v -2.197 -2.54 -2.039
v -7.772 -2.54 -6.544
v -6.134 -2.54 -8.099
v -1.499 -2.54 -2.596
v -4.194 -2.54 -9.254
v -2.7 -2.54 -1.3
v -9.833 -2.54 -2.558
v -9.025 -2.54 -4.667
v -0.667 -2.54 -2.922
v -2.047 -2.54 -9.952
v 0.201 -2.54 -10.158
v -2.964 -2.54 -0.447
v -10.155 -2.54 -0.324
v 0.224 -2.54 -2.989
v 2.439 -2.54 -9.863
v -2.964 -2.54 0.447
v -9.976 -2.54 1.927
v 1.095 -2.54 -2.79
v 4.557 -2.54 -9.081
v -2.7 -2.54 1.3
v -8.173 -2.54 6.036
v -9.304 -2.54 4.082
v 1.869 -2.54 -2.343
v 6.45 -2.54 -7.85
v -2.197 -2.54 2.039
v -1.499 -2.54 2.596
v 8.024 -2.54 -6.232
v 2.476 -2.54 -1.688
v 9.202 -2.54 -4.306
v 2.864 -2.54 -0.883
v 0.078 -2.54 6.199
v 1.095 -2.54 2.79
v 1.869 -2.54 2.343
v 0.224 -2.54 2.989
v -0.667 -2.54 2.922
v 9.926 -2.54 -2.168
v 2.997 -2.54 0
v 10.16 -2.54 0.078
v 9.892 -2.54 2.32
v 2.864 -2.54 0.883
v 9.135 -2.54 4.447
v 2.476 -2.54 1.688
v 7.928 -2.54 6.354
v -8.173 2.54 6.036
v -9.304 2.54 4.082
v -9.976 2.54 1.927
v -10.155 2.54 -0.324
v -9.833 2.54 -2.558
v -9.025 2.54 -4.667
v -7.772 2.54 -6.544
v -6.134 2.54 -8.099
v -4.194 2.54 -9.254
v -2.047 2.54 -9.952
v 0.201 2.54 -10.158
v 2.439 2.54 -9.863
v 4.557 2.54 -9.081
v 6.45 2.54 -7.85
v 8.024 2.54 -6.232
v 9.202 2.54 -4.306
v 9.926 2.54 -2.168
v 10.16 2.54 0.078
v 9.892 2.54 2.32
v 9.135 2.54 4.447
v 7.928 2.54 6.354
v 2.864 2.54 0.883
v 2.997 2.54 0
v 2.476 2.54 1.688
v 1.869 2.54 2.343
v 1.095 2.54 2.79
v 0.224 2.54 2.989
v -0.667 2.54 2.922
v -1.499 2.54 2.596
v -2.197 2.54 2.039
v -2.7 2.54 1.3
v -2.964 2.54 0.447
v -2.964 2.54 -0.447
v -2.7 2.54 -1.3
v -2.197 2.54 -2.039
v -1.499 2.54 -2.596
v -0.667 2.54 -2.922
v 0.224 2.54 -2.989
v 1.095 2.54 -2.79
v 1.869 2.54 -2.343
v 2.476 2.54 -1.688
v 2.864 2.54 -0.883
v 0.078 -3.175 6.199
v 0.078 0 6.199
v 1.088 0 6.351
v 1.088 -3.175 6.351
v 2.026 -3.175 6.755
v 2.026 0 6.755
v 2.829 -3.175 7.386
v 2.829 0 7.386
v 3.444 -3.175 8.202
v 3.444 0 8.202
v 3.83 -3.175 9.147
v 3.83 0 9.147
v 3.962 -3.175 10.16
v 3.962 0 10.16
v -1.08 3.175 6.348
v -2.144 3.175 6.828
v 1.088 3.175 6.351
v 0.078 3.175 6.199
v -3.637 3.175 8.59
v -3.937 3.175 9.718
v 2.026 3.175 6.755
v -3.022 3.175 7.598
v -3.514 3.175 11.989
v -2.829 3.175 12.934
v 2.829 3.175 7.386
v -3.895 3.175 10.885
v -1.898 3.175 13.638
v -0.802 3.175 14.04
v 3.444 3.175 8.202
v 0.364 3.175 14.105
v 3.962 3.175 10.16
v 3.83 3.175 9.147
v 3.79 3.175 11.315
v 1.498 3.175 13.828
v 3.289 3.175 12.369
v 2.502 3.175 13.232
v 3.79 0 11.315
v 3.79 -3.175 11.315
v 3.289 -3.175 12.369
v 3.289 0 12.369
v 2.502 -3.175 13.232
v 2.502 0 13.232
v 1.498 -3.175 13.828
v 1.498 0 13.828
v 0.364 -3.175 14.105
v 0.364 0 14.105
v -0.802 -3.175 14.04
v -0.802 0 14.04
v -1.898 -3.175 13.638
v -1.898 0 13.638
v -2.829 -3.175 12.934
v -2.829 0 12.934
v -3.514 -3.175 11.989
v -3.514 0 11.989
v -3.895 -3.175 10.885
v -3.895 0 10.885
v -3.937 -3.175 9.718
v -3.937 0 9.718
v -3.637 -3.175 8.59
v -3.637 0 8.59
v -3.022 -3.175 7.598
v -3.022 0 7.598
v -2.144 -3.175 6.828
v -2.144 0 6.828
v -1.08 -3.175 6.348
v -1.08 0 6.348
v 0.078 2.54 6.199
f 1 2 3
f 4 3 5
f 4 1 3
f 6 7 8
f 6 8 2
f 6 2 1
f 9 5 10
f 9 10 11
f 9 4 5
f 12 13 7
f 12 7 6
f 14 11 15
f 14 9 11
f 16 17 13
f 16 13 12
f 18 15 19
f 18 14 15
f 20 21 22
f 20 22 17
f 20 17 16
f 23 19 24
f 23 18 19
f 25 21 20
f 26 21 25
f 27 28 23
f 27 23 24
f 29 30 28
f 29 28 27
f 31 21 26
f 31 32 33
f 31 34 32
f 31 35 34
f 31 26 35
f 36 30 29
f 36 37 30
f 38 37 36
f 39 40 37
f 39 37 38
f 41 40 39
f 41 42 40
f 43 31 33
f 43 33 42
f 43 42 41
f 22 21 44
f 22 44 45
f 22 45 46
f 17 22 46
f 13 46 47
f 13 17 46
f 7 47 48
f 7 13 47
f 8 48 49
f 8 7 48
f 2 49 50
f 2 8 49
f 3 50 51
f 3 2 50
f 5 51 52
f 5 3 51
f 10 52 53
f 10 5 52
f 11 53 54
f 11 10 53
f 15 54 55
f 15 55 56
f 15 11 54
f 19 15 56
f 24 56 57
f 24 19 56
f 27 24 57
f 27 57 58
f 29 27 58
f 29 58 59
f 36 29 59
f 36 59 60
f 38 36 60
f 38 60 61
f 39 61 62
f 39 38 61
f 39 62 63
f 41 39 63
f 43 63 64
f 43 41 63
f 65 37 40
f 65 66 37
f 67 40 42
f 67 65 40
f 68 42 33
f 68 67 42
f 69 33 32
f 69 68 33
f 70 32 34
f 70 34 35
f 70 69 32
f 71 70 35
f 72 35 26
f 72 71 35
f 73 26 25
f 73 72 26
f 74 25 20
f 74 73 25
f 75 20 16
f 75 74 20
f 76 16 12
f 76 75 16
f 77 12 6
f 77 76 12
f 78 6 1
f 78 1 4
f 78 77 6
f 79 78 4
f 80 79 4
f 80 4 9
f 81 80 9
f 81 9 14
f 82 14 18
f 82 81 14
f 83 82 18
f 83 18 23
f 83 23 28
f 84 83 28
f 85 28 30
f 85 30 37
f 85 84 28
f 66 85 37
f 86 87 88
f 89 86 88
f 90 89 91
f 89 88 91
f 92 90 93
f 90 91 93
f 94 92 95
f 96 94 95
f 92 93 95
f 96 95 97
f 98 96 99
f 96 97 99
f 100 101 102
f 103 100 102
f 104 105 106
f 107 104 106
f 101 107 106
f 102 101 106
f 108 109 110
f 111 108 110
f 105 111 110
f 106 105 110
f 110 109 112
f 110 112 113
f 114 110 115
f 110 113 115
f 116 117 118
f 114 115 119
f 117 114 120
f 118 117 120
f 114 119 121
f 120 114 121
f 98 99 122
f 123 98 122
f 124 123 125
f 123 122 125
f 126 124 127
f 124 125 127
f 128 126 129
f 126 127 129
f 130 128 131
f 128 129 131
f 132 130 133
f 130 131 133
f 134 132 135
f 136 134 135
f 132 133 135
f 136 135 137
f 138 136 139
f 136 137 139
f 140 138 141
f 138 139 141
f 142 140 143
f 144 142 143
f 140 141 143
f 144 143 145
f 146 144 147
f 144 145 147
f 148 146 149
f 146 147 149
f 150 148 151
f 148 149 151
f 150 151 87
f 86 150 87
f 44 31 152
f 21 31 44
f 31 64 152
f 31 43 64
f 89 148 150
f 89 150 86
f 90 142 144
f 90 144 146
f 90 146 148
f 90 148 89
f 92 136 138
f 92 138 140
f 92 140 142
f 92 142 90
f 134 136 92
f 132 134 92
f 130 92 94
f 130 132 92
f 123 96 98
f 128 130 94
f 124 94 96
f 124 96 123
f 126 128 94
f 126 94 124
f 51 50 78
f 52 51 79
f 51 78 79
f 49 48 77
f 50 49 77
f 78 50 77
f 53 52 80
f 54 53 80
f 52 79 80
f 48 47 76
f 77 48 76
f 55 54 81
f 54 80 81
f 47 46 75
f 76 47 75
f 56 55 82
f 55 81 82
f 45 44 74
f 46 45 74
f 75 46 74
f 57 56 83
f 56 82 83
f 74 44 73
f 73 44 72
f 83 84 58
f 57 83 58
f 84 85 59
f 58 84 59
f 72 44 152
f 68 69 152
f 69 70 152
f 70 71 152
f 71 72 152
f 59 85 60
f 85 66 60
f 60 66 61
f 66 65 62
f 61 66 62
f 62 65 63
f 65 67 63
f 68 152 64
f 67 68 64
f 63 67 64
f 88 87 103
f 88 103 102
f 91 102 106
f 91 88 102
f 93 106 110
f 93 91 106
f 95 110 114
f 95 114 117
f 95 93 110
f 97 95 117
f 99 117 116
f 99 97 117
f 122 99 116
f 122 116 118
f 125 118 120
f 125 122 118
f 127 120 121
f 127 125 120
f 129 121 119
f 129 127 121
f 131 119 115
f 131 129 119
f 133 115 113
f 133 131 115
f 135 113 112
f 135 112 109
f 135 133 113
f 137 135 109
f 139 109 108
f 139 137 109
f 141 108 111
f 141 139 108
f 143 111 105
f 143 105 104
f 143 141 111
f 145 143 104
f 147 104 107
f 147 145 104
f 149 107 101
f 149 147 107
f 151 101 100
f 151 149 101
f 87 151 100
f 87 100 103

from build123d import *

# Parameters (mm, degrees)
F0_R     = 2.9972
F1_DEPTH = 2.54
F2_DEPTH = 3.175


# Not quite as in the source:
# - a feature names something its author has since deleted; it is built from what else it names


with BuildPart() as f1:
    # F0 (on Front) → F1 (new body, symmetric)
    with BuildSketch(Plane.XZ):
        with BuildLine():
            Line((0.078317611, 6.1990582674), (-8.172718603, 6.0359150621))
            ThreePointArc((-8.172718603, 6.0359150621), (0.2008488403, -10.1580145572), (7.9277344701, 6.354260474))
            Line((7.9277344701, 6.354260474), (0.078317611, 6.1990582674))
        make_face()
        Circle(F0_R, mode=Mode.SUBTRACT)
    extrude(amount=F1_DEPTH, both=True)


with BuildPart() as f2:
    # F0 (on Front) → F2 (new body, symmetric)
    with BuildSketch(Plane.XZ):
        with BuildLine():
            ThreePointArc((3.9617159233, 10.16), (-2.828910142, 12.9335285225), (0.078317611, 6.1990582674))
            ThreePointArc((0.078317611, 6.1990582674), (2.828910142, 7.3864714775), (3.9617159233, 10.16))
        make_face()
    extrude(amount=F2_DEPTH, both=True)


solid = Compound([f1.part, f2.part])
